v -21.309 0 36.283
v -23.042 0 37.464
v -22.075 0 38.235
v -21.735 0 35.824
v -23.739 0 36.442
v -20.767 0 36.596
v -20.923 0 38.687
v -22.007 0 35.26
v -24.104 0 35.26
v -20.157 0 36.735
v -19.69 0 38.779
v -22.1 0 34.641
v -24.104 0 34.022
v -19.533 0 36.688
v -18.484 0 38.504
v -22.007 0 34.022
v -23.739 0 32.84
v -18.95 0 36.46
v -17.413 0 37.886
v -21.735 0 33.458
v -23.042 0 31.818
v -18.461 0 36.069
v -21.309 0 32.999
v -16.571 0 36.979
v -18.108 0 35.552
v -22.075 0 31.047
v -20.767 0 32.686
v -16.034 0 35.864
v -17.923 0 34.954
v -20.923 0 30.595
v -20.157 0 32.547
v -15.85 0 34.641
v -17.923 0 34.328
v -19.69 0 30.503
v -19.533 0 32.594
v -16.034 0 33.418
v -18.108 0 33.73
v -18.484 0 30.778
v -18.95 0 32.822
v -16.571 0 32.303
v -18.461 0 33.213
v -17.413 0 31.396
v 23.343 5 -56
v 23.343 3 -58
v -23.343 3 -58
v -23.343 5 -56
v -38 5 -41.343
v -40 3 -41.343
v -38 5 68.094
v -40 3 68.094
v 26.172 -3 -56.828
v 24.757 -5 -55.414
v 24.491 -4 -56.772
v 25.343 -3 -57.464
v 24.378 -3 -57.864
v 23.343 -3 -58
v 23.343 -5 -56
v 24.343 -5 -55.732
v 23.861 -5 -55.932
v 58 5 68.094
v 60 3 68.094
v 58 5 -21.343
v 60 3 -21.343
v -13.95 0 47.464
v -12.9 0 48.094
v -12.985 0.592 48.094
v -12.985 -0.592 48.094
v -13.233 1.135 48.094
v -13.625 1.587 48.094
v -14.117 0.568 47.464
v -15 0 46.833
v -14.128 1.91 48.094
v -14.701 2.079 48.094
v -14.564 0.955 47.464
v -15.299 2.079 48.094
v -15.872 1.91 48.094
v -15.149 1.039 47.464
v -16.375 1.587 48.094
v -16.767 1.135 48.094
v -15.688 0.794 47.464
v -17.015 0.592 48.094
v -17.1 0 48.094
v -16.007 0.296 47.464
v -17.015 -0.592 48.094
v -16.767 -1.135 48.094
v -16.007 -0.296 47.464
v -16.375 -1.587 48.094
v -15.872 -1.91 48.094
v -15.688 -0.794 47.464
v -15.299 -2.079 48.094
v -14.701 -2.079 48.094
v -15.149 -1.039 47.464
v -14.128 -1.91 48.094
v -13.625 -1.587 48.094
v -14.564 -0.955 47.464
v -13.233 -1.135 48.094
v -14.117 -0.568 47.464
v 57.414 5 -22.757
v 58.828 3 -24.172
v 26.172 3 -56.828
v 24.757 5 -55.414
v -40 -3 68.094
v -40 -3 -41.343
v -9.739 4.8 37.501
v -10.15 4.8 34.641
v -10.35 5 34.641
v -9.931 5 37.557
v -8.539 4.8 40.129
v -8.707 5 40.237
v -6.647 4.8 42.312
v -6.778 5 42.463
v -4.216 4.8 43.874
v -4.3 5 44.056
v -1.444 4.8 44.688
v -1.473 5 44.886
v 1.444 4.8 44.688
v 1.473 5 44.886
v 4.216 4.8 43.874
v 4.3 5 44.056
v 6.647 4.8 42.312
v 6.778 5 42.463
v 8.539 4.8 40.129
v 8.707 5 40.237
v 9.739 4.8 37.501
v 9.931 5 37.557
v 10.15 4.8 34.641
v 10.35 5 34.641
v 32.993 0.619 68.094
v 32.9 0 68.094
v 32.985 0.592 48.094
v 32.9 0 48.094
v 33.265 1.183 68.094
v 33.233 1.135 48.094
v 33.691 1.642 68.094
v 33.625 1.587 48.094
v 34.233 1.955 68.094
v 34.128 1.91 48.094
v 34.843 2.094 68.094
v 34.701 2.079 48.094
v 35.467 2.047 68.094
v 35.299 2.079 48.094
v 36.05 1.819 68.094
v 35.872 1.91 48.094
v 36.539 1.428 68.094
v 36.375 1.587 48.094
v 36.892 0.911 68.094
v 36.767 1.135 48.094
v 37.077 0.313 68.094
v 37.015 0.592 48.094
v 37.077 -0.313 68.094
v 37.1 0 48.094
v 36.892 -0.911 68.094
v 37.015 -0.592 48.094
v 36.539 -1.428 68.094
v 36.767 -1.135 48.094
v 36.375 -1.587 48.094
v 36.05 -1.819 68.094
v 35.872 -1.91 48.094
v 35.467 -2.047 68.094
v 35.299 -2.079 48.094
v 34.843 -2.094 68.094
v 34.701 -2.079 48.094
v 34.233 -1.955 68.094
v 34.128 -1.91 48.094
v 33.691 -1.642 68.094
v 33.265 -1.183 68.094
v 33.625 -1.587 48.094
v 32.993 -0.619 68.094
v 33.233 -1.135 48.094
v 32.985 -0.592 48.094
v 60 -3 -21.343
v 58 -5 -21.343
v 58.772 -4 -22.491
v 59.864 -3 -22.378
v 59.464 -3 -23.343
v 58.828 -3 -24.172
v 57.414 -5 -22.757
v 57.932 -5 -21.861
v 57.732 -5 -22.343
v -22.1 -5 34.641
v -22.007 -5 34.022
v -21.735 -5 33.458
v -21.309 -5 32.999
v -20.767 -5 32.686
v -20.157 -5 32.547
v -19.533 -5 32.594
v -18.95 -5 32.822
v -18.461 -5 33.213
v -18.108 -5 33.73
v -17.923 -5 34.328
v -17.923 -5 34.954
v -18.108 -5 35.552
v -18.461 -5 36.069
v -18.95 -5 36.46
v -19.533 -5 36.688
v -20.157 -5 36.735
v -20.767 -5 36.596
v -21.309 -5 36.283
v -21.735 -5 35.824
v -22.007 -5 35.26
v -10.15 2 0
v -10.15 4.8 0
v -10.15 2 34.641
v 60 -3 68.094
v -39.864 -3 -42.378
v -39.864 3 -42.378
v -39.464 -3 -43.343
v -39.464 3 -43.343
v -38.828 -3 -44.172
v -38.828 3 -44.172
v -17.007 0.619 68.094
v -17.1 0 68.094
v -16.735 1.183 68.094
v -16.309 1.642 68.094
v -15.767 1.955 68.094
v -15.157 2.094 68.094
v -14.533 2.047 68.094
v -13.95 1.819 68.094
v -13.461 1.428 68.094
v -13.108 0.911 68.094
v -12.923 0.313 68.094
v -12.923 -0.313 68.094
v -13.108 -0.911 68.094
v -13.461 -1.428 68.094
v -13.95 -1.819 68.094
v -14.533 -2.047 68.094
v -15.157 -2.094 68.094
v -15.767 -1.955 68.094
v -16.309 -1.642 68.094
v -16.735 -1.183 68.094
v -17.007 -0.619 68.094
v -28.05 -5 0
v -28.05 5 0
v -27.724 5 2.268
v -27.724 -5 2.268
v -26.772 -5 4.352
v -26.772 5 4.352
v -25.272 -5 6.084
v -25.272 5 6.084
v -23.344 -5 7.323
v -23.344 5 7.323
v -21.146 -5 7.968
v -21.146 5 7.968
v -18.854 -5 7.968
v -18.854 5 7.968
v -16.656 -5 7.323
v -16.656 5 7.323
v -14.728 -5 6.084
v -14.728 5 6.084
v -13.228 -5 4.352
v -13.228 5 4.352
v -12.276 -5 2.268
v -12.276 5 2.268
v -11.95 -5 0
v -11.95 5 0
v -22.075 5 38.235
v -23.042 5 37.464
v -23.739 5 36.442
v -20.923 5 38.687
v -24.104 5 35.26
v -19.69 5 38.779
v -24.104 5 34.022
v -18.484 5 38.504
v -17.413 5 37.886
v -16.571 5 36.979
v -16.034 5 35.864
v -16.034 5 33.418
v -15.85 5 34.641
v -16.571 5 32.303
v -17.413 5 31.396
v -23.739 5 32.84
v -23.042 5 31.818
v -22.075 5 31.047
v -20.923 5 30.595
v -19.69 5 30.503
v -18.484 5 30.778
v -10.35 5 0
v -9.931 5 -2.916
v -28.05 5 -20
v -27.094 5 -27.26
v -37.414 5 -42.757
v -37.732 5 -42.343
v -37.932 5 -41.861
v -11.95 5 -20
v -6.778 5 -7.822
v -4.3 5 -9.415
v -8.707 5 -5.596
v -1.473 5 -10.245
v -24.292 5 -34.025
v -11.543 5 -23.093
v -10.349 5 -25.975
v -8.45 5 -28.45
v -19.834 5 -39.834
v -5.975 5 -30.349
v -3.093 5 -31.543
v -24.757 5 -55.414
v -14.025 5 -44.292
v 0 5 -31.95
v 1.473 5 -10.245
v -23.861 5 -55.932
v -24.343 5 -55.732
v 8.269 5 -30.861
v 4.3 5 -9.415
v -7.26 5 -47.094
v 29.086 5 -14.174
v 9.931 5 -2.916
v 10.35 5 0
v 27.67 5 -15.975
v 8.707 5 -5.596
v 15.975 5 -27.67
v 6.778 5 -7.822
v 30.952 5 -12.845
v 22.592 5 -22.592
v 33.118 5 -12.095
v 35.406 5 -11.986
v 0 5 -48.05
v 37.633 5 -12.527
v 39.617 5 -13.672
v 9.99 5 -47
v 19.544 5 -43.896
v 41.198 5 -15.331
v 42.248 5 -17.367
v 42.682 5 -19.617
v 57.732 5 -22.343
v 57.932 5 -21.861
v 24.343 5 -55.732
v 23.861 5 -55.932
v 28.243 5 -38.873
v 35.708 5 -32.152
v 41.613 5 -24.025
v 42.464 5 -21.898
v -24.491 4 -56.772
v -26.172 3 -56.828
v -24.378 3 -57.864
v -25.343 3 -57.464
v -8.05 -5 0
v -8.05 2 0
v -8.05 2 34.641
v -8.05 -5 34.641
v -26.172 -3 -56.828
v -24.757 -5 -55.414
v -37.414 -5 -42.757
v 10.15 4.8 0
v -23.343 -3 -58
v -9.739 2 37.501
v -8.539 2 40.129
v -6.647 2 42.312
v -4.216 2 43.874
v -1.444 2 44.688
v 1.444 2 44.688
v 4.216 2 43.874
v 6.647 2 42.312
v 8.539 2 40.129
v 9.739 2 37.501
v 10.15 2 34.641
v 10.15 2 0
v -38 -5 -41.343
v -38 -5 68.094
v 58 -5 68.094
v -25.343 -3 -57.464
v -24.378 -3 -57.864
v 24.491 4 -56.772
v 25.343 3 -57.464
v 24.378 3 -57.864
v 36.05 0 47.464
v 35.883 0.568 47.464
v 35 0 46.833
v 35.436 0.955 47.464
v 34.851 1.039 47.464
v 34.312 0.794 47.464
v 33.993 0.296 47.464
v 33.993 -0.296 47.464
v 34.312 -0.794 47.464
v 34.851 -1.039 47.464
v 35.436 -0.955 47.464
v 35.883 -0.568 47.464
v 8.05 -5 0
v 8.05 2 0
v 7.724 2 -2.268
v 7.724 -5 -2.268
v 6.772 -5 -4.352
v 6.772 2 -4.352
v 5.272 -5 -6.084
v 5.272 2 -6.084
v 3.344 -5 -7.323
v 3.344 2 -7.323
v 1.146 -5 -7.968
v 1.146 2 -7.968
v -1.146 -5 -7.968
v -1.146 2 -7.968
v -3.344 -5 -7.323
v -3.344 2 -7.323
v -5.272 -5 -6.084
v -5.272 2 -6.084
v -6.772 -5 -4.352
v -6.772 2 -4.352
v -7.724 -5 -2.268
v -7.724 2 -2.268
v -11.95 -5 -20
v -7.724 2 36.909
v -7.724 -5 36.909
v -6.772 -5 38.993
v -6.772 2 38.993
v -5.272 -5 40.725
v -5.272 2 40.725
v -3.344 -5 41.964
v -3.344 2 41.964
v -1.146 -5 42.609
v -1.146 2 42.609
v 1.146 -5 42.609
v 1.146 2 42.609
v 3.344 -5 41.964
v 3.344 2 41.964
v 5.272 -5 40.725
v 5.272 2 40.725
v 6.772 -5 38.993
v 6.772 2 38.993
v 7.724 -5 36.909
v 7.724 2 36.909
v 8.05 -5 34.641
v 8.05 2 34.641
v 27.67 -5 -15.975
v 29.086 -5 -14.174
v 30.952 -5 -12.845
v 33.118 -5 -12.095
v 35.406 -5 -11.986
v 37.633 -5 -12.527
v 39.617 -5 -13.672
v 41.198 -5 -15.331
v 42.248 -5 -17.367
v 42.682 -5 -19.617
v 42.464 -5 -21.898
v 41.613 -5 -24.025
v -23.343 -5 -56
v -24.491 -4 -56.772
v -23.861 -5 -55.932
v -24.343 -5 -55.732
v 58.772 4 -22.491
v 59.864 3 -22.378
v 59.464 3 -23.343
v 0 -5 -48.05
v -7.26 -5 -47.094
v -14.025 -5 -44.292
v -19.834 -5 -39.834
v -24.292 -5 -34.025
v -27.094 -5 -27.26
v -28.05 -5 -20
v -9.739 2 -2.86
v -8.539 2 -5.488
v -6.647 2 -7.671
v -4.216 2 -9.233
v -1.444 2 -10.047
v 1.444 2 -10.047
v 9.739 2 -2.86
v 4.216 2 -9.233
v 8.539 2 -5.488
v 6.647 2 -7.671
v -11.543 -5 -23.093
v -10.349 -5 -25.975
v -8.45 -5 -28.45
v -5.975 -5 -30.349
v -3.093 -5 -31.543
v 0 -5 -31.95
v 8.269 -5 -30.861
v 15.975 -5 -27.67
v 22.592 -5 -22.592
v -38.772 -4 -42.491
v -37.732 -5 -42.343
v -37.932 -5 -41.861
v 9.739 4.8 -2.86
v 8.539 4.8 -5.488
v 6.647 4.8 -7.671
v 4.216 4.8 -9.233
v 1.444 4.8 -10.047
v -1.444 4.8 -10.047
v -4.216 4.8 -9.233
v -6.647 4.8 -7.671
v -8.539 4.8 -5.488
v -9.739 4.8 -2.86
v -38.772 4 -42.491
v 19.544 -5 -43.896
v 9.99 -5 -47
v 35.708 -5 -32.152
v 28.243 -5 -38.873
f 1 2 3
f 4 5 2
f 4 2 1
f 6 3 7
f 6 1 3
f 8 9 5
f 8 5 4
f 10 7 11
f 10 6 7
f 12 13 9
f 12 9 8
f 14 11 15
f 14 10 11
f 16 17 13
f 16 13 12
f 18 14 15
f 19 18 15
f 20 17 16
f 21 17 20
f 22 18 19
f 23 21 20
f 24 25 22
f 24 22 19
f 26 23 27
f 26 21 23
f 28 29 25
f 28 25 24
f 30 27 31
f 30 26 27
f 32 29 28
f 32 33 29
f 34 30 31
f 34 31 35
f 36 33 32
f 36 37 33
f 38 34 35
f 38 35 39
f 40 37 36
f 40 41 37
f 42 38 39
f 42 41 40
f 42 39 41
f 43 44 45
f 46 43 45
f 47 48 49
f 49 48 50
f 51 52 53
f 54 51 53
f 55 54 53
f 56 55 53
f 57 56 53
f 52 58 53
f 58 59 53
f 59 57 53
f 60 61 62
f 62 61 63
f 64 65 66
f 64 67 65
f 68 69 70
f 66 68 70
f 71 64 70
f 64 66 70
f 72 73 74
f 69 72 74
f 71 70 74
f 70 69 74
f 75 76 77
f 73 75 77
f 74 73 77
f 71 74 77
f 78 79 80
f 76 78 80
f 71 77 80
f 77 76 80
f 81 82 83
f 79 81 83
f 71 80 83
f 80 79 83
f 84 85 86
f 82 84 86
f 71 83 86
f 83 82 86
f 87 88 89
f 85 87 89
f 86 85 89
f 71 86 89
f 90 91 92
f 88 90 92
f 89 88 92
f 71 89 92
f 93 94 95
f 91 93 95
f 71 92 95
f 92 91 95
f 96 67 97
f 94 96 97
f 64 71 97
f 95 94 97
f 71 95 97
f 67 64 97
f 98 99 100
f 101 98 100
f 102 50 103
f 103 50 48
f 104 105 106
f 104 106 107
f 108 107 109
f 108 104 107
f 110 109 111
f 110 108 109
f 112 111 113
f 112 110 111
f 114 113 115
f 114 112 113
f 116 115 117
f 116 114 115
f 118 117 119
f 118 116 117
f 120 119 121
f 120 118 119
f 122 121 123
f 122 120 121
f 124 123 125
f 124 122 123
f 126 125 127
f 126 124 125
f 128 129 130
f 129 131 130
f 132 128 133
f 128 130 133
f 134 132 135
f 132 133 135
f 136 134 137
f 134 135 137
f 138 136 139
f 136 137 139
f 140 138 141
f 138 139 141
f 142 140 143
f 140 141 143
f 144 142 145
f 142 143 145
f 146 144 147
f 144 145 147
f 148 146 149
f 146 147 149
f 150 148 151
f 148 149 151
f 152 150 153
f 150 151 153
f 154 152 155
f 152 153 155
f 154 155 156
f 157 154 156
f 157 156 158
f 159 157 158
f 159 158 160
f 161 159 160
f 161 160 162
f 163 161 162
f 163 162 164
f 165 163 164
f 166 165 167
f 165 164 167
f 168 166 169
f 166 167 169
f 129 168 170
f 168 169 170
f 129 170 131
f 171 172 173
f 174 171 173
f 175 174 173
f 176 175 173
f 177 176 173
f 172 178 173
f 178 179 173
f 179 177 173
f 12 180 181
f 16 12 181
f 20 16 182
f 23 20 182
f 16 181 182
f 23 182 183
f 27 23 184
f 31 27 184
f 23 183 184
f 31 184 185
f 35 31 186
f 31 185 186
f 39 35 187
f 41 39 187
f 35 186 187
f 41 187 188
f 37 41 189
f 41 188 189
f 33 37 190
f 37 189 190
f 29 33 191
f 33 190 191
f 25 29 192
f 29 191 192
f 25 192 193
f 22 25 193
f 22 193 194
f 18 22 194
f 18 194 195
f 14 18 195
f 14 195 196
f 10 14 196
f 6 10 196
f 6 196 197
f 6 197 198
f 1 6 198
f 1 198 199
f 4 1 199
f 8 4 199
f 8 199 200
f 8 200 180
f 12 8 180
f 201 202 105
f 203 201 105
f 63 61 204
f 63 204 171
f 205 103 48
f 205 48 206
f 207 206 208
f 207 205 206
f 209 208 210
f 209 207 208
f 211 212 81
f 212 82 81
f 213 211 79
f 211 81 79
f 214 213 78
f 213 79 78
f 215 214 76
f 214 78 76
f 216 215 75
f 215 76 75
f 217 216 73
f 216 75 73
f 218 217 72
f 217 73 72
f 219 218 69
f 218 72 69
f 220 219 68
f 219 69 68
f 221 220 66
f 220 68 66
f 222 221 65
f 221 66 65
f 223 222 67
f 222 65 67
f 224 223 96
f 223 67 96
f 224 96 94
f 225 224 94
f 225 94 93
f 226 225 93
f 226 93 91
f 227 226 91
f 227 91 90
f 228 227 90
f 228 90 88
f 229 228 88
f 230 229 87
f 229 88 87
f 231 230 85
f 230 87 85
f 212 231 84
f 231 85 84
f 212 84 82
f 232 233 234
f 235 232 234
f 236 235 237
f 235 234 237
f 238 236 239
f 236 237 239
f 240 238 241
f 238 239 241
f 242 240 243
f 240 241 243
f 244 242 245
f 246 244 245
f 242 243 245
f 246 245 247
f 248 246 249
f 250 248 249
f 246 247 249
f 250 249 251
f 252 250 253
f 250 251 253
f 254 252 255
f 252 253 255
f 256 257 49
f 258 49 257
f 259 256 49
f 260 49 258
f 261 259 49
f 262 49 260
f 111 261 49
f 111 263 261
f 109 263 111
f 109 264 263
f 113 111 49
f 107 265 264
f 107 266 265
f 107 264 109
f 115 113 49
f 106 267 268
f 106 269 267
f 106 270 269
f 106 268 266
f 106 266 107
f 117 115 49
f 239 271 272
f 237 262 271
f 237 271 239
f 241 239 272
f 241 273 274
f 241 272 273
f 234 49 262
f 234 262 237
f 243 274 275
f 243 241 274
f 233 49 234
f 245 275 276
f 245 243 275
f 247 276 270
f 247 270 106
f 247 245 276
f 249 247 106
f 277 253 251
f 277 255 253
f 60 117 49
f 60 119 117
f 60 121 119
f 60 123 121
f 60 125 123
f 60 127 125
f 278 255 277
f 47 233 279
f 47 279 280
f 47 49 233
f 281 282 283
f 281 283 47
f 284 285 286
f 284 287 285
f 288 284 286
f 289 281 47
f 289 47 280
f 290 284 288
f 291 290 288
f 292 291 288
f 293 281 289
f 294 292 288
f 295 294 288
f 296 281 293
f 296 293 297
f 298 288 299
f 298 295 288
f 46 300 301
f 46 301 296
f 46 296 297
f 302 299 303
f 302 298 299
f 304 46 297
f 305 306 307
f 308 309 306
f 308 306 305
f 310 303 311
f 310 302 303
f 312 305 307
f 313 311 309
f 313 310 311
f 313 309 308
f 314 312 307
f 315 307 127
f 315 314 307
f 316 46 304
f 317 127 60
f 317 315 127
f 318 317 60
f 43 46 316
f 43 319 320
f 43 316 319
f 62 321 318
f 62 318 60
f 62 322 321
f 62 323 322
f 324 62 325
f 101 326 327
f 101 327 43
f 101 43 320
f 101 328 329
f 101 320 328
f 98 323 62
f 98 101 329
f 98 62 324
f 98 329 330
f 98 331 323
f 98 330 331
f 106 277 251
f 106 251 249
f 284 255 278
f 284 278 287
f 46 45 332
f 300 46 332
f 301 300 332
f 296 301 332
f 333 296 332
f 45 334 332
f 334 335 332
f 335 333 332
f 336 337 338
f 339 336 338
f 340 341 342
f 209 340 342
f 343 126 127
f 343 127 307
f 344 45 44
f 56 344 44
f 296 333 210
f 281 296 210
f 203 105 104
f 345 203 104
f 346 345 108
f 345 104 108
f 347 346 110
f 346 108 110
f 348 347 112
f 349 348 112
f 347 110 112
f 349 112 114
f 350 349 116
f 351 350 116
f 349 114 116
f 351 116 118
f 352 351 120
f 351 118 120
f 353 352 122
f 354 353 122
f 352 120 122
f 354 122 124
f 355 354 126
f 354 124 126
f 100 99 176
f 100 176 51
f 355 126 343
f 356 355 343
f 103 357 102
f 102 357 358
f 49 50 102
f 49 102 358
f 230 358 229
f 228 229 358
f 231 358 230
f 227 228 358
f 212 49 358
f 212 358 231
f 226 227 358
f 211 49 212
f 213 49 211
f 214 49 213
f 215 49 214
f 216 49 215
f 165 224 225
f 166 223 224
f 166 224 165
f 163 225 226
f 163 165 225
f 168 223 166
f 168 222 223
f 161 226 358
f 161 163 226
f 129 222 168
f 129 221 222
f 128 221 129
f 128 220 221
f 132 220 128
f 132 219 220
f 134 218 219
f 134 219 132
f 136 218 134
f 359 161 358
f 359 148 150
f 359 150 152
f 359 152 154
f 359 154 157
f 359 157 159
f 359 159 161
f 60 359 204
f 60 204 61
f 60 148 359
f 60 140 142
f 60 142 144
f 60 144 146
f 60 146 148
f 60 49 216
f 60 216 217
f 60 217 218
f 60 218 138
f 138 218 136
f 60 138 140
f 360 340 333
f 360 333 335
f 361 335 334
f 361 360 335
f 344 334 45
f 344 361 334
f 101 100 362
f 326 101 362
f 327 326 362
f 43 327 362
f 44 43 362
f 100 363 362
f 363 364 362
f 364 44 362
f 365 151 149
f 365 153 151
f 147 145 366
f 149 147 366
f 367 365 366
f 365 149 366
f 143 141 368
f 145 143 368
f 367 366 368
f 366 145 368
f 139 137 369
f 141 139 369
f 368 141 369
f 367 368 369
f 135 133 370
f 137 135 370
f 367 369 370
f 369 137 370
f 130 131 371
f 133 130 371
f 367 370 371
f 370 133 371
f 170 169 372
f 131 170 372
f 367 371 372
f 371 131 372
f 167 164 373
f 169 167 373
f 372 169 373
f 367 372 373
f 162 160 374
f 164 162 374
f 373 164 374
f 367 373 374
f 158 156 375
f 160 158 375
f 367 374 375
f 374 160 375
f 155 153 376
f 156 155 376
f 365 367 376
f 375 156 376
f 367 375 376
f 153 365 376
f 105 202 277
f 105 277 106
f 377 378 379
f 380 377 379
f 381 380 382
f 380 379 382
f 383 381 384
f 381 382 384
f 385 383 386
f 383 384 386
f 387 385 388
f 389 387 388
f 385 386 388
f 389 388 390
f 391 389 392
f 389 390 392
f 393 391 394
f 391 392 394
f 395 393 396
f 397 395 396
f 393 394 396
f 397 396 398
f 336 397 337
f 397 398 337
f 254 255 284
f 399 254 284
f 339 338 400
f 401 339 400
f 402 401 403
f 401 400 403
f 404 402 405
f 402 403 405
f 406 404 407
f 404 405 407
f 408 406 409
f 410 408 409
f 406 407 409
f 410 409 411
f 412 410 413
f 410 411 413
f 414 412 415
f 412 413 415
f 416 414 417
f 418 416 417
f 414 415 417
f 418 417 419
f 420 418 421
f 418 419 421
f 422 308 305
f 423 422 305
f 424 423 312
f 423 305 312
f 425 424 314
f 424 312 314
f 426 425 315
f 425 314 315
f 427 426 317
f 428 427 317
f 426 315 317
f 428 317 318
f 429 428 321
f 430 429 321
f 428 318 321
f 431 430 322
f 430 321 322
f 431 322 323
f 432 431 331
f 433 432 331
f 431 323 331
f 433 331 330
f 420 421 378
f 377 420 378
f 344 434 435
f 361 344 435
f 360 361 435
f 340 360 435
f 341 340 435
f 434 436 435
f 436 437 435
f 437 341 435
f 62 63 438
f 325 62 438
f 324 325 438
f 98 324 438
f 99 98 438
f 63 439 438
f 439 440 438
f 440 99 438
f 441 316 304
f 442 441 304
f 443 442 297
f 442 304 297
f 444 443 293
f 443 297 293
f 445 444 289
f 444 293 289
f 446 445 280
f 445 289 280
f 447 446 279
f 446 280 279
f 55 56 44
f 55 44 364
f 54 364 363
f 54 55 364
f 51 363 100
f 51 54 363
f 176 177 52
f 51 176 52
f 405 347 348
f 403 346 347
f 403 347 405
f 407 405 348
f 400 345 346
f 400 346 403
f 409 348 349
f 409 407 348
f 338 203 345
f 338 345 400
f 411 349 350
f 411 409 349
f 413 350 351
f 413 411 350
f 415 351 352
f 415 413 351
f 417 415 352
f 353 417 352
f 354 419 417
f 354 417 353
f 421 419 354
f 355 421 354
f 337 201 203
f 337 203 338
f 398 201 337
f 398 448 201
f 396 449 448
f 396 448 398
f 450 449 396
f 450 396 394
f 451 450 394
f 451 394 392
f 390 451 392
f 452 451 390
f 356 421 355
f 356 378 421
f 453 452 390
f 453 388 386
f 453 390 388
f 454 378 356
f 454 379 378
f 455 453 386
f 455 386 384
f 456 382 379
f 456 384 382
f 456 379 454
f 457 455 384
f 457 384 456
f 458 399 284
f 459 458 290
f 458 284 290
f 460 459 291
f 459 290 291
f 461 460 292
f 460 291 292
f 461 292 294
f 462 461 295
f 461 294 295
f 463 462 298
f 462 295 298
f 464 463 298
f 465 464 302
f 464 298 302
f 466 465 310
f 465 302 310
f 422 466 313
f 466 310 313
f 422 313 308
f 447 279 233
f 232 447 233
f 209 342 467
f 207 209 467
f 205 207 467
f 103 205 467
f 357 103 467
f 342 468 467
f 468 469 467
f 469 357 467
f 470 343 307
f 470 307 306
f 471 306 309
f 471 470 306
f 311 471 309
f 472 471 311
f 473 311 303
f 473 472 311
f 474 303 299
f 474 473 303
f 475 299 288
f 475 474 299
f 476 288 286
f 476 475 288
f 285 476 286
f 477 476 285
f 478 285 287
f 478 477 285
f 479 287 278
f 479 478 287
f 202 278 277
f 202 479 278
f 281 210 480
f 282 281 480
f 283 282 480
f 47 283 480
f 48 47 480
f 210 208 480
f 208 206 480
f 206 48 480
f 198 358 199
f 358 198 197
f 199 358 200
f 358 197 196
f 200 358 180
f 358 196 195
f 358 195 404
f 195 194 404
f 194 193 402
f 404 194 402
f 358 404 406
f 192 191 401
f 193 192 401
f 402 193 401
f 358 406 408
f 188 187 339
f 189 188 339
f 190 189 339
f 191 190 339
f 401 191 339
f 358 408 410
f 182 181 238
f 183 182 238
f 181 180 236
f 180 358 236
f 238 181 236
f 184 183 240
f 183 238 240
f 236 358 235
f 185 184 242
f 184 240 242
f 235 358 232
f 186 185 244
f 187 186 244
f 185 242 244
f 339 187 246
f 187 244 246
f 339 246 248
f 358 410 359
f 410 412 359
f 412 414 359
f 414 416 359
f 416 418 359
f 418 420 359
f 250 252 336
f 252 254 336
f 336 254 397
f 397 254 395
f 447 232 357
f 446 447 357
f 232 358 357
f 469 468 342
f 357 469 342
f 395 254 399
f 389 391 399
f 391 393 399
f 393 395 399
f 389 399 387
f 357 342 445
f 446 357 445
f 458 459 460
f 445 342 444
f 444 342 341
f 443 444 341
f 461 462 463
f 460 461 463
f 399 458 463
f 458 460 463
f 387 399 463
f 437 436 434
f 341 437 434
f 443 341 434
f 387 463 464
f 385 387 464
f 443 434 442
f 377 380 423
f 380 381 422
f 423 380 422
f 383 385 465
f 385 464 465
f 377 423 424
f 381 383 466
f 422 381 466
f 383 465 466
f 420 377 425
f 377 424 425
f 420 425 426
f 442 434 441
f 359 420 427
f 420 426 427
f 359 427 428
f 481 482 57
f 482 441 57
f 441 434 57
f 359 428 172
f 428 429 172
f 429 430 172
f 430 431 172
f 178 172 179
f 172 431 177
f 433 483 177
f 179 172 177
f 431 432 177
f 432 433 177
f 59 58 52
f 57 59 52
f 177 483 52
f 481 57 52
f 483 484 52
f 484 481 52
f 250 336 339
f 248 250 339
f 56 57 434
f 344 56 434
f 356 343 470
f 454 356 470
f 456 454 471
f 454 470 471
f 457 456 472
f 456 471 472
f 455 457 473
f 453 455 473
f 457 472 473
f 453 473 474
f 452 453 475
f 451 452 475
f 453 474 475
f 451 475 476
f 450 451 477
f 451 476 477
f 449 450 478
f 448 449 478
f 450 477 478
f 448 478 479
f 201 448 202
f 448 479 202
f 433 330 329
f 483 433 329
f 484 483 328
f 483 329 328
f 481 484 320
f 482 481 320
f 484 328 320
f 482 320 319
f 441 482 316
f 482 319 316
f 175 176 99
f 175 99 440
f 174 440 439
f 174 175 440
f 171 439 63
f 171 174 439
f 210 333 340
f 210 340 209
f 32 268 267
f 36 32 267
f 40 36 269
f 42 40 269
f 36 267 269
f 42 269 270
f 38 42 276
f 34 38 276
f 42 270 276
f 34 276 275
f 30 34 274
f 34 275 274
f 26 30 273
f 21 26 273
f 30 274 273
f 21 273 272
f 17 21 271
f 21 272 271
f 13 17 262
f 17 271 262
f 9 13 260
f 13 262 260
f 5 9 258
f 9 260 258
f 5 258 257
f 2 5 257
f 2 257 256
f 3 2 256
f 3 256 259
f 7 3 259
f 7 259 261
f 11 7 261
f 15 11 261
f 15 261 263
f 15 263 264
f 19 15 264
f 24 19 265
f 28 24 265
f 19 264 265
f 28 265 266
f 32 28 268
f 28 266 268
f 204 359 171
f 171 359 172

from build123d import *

# Parameters (mm, degrees)
SKETCH1_W                 = 100
SKETCH1_H                 = 126.094412
BOSS_EXTRUDE1_DEPTH       = 5
SLOTS_DEPTH               = 11
CUT_EXTRUDE5_DEPTH        = 3
CHAMFER2_SIZE             = 0.2
M5X0_8_TAPPED_HOLE2_D     = 4.2
SKETCH10_R                = 4.15
CUT_EXTRUDE4_DEPTH        = 5
M5X0_8_TAPPED_HOLE1_D     = 4.2
M5X0_8_TAPPED_HOLE1_DEPTH = 20
M5X0_8_TAPPED_HOLE1_TIP   = 1.2618073
CUT_EXTRUDE2_DEPTH        = 11
CUT_EXTRUDE3_DEPTH        = 11
FILLET1_R                 = 4
CHAMFER1_SIZE             = 2


with BuildPart() as part:
    # Sketch1 → Boss-Extrude1 (new body, symmetric)
    with BuildSketch(Plane(origin=(0, 0, 0), x_dir=(1, 0, 0), z_dir=(0, 1, 0))):
        with Locations((10, -5.047206)):
            Rectangle(SKETCH1_W, SKETCH1_H)
    extrude(amount=BOSS_EXTRUDE1_DEPTH, both=True)

    # Sketch3 → Slots (cut, through all)
    with BuildSketch(Plane(origin=(0, 5, 0), x_dir=(1, 0, 0), z_dir=(0, 1, 0))):
        with BuildLine():
            Line((-8.05, 0), (-8.05, -34.641016151))
            ThreePointArc((-8.05, -34.641016151), (0, -42.691016151), (8.05, -34.641016151))
            Line((8.05, -34.641016151), (8.05, 0))
            ThreePointArc((8.05, 0), (0, 8.05), (-8.05, 0))
        make_face()
        with BuildLine():
            Line((-11.95, 0), (-11.95, 20))
            ThreePointArc((-11.95, 20), (-8.449926035, 28.449926035), (0, 31.95))
            ThreePointArc((0, 31.95), (15.975, 27.669511651), (27.669511651, 15.975))
            ThreePointArc((27.669511651, 15.975), (38.666016151, 13.0284955), (41.612520652, 24.025))
            ThreePointArc((41.612520652, 24.025), (24.025, 41.612520652), (0, 48.05))
            ThreePointArc((0, 48.05), (-19.834345212, 39.834345212), (-28.05, 20))
            Line((-28.05, 20), (-28.05, 0))
            ThreePointArc((-28.05, 0), (-20, -8.05), (-11.95, 0))
        make_face()
    extrude(amount=-SLOTS_DEPTH, mode=Mode.SUBTRACT)

    # Sketch11 → Cut-Extrude5 (cut)
    with BuildSketch(Plane(origin=(0, 5, 0), x_dir=(1, 0, 0), z_dir=(0, 1, 0))):
        with BuildLine():
            Line((-10.15, 0), (-10.15, -34.641016151))
            ThreePointArc((-10.15, -34.641016151), (0, -44.791016151), (10.15, -34.641016151))
            Line((10.15, -34.641016151), (10.15, 0))
            ThreePointArc((10.15, 0), (0, 10.15), (-10.15, 0))
        make_face()
    extrude(amount=-CUT_EXTRUDE5_DEPTH, mode=Mode.SUBTRACT)

    # Chamfer2
    chamfer2_edges = [part.edges().sort_by_distance(p)[0] for p in [
        (0, 5, -10.15),
        (-10.15, 5, 17.320508076),
        (0, 5, 44.791016151),
        (10.15, 5, 17.320508076),
    ]]
    chamfer(chamfer2_edges, length=CHAMFER2_SIZE)

    # M5x0.8 Tapped Hole2 (through all)
    with Locations(Plane(origin=(0, 5, 0), x_dir=(1, 0, 0), z_dir=(0, 1, 0))):
        with Locations((-20, -34.641016151)):
            Hole(M5X0_8_TAPPED_HOLE2_D / 2)

    # Sketch10 → Cut-Extrude4 (cut)
    with BuildSketch(Plane(origin=(0, 5, 0), x_dir=(1, 0, 0), z_dir=(0, 1, 0))):
        with Locations((-20, -34.641016151)):
            Circle(SKETCH10_R)
    extrude(amount=-CUT_EXTRUDE4_DEPTH, mode=Mode.SUBTRACT)

    # M5x0.8 Tapped Hole1
    with Locations(Plane.XY.offset(68.094412)):
        with Locations((-15, 0), (35, 0)):
            Hole(M5X0_8_TAPPED_HOLE1_D / 2, depth=M5X0_8_TAPPED_HOLE1_DEPTH)
            with Locations((0, 0, -(M5X0_8_TAPPED_HOLE1_DEPTH + M5X0_8_TAPPED_HOLE1_TIP / 2))):  # 118° drill point
                Cone(0, M5X0_8_TAPPED_HOLE1_D / 2, M5X0_8_TAPPED_HOLE1_TIP, mode=Mode.SUBTRACT)

    # Sketch4 → Cut-Extrude2 (cut, through all)
    with BuildSketch(Plane(origin=(0, 5, 0), x_dir=(1, 0, 0), z_dir=(0, 1, 0))):
        Polygon((-40, 43), (-40, 58), (-25, 58), align=None)
    extrude(amount=-CUT_EXTRUDE2_DEPTH, mode=Mode.SUBTRACT)

    # Sketch5 → Cut-Extrude3 (cut, through all)
    with BuildSketch(Plane(origin=(0, 5, 0), x_dir=(1, 0, 0), z_dir=(0, 1, 0))):
        Polygon((25, 58), (60, 58), (60, 23), align=None)
    extrude(amount=-CUT_EXTRUDE3_DEPTH, mode=Mode.SUBTRACT)

    # Fillet1
    fillet1_edges = [part.edges().sort_by_distance(p)[0] for p in [
        (-25, 0, -58),
        (-40, 0, -43),
        (60, 0, -23),
        (25, 0, -58),
    ]]
    fillet(fillet1_edges, radius=FILLET1_R)

    # Chamfer1
    chamfer1_edges = [part.edges().sort_by_distance(p)[0] for p in [
        (60, 5, 23.375633125),
        (42.5, 5, -40.5),
        (0, 5, -58),
        (-32.5, 5, -50.5),
        (-40, 5, 13.375633125),
        (-39.69551813, 5, -42.87387948),
        (-24.87387948, 5, -57.69551813),
        (24.87387948, 5, -57.69551813),
        (59.69551813, 5, -22.87387948),
        (42.5, -5, -40.5),
        (-40, -5, 13.375633125),
        (-32.5, -5, -50.5),
        (0, -5, -58),
        (-39.69551813, -5, -42.87387948),
        (-24.87387948, -5, -57.69551813),
        (24.87387948, -5, -57.69551813),
        (59.69551813, -5, -22.87387948),
        (60, -5, 23.375633125),
    ]]
    chamfer(chamfer1_edges, length=CHAMFER1_SIZE)


solid = part.part
